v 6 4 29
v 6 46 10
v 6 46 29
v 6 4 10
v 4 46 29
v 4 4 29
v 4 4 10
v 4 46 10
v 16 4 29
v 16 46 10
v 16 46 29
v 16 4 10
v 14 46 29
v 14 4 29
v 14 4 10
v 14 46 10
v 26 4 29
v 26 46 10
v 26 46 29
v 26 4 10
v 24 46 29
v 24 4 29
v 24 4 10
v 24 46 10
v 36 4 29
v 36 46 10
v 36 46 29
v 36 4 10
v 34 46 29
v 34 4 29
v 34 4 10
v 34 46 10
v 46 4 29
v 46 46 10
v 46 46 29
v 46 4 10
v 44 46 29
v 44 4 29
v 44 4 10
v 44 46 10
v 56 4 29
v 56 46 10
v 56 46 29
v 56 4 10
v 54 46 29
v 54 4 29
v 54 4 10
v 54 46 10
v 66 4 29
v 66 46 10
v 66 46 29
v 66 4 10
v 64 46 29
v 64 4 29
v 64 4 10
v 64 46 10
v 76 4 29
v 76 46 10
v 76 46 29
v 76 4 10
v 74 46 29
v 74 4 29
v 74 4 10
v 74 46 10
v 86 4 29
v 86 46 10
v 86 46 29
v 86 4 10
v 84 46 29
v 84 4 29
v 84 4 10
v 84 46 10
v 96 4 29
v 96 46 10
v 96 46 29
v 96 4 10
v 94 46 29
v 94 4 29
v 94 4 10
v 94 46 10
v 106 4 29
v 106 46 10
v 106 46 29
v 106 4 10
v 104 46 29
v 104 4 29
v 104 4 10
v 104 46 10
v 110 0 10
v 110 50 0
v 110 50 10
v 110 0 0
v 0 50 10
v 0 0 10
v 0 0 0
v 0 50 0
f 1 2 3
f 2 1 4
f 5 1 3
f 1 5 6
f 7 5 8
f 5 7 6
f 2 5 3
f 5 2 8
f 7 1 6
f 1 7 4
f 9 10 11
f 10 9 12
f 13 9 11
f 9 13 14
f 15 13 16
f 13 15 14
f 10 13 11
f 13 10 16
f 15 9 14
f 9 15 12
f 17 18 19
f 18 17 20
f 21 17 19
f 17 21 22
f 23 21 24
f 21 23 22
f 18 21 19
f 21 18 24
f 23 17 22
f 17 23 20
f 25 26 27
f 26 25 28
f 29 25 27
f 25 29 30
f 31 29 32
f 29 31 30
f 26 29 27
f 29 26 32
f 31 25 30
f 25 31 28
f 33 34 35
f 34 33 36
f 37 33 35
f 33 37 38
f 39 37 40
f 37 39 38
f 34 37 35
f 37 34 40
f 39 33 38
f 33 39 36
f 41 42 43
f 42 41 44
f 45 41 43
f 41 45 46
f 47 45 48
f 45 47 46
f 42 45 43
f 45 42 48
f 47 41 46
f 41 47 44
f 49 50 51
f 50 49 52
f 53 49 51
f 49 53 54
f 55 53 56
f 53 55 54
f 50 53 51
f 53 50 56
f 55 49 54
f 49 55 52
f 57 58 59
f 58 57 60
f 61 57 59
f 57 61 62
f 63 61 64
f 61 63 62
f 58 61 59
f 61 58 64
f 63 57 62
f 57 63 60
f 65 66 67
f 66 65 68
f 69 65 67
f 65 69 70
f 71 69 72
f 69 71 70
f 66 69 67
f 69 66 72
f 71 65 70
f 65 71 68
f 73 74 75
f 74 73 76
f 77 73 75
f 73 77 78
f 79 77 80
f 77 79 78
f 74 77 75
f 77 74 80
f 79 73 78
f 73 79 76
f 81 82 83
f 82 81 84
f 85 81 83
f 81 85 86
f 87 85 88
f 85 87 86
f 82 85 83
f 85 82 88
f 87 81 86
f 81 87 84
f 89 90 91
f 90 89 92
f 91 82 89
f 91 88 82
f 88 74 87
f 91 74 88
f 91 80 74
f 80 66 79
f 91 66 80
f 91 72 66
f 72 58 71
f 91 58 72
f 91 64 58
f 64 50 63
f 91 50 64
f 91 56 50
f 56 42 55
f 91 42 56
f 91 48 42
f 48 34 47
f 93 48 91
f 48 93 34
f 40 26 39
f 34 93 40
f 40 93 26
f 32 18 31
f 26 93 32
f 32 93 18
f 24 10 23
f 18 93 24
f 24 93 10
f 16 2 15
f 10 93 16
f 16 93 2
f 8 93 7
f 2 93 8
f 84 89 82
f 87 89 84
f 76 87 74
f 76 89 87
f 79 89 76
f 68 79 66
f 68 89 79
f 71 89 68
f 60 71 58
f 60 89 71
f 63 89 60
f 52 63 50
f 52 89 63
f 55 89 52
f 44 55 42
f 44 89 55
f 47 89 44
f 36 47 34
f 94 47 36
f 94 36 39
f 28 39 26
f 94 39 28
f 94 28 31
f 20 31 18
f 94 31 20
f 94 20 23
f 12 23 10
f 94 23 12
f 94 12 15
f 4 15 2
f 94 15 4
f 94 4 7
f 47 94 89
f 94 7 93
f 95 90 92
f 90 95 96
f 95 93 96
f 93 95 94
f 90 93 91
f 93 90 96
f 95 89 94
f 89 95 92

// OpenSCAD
$fn = 32;

// ----------------------------------------------------------------------
// Heatsink: uniform fin block
// ----------------------------------------------------------------------

// --- parameters (mm) ---
base_l = 110;             // base length, X
base_w = 50;              // base width, Y
base_t = 10;              // base plate thickness
fin_h = 20;               // fin height above the base
fin_t = 2;                // fin thickness
edge = 4;                 // margin from the base ends
pitch = 10;               // fin pitch
fit_tol = 0.05;           // tolerance for press fits, mm
free_tol = 0.2;           // tolerance for clearance fits, mm

n_fins = floor((base_l - 2 * edge - fin_t) / pitch) + 1;  // fin count
total_h = base_t + fin_h - 1;  // overall height

union() {
  cube([base_l, base_w, base_t]);
  for (i = [0 : n_fins - 1])
    translate([edge + i * pitch, edge, base_t - 1])
      cube([fin_t, base_w - 2 * edge, fin_h]);
}
